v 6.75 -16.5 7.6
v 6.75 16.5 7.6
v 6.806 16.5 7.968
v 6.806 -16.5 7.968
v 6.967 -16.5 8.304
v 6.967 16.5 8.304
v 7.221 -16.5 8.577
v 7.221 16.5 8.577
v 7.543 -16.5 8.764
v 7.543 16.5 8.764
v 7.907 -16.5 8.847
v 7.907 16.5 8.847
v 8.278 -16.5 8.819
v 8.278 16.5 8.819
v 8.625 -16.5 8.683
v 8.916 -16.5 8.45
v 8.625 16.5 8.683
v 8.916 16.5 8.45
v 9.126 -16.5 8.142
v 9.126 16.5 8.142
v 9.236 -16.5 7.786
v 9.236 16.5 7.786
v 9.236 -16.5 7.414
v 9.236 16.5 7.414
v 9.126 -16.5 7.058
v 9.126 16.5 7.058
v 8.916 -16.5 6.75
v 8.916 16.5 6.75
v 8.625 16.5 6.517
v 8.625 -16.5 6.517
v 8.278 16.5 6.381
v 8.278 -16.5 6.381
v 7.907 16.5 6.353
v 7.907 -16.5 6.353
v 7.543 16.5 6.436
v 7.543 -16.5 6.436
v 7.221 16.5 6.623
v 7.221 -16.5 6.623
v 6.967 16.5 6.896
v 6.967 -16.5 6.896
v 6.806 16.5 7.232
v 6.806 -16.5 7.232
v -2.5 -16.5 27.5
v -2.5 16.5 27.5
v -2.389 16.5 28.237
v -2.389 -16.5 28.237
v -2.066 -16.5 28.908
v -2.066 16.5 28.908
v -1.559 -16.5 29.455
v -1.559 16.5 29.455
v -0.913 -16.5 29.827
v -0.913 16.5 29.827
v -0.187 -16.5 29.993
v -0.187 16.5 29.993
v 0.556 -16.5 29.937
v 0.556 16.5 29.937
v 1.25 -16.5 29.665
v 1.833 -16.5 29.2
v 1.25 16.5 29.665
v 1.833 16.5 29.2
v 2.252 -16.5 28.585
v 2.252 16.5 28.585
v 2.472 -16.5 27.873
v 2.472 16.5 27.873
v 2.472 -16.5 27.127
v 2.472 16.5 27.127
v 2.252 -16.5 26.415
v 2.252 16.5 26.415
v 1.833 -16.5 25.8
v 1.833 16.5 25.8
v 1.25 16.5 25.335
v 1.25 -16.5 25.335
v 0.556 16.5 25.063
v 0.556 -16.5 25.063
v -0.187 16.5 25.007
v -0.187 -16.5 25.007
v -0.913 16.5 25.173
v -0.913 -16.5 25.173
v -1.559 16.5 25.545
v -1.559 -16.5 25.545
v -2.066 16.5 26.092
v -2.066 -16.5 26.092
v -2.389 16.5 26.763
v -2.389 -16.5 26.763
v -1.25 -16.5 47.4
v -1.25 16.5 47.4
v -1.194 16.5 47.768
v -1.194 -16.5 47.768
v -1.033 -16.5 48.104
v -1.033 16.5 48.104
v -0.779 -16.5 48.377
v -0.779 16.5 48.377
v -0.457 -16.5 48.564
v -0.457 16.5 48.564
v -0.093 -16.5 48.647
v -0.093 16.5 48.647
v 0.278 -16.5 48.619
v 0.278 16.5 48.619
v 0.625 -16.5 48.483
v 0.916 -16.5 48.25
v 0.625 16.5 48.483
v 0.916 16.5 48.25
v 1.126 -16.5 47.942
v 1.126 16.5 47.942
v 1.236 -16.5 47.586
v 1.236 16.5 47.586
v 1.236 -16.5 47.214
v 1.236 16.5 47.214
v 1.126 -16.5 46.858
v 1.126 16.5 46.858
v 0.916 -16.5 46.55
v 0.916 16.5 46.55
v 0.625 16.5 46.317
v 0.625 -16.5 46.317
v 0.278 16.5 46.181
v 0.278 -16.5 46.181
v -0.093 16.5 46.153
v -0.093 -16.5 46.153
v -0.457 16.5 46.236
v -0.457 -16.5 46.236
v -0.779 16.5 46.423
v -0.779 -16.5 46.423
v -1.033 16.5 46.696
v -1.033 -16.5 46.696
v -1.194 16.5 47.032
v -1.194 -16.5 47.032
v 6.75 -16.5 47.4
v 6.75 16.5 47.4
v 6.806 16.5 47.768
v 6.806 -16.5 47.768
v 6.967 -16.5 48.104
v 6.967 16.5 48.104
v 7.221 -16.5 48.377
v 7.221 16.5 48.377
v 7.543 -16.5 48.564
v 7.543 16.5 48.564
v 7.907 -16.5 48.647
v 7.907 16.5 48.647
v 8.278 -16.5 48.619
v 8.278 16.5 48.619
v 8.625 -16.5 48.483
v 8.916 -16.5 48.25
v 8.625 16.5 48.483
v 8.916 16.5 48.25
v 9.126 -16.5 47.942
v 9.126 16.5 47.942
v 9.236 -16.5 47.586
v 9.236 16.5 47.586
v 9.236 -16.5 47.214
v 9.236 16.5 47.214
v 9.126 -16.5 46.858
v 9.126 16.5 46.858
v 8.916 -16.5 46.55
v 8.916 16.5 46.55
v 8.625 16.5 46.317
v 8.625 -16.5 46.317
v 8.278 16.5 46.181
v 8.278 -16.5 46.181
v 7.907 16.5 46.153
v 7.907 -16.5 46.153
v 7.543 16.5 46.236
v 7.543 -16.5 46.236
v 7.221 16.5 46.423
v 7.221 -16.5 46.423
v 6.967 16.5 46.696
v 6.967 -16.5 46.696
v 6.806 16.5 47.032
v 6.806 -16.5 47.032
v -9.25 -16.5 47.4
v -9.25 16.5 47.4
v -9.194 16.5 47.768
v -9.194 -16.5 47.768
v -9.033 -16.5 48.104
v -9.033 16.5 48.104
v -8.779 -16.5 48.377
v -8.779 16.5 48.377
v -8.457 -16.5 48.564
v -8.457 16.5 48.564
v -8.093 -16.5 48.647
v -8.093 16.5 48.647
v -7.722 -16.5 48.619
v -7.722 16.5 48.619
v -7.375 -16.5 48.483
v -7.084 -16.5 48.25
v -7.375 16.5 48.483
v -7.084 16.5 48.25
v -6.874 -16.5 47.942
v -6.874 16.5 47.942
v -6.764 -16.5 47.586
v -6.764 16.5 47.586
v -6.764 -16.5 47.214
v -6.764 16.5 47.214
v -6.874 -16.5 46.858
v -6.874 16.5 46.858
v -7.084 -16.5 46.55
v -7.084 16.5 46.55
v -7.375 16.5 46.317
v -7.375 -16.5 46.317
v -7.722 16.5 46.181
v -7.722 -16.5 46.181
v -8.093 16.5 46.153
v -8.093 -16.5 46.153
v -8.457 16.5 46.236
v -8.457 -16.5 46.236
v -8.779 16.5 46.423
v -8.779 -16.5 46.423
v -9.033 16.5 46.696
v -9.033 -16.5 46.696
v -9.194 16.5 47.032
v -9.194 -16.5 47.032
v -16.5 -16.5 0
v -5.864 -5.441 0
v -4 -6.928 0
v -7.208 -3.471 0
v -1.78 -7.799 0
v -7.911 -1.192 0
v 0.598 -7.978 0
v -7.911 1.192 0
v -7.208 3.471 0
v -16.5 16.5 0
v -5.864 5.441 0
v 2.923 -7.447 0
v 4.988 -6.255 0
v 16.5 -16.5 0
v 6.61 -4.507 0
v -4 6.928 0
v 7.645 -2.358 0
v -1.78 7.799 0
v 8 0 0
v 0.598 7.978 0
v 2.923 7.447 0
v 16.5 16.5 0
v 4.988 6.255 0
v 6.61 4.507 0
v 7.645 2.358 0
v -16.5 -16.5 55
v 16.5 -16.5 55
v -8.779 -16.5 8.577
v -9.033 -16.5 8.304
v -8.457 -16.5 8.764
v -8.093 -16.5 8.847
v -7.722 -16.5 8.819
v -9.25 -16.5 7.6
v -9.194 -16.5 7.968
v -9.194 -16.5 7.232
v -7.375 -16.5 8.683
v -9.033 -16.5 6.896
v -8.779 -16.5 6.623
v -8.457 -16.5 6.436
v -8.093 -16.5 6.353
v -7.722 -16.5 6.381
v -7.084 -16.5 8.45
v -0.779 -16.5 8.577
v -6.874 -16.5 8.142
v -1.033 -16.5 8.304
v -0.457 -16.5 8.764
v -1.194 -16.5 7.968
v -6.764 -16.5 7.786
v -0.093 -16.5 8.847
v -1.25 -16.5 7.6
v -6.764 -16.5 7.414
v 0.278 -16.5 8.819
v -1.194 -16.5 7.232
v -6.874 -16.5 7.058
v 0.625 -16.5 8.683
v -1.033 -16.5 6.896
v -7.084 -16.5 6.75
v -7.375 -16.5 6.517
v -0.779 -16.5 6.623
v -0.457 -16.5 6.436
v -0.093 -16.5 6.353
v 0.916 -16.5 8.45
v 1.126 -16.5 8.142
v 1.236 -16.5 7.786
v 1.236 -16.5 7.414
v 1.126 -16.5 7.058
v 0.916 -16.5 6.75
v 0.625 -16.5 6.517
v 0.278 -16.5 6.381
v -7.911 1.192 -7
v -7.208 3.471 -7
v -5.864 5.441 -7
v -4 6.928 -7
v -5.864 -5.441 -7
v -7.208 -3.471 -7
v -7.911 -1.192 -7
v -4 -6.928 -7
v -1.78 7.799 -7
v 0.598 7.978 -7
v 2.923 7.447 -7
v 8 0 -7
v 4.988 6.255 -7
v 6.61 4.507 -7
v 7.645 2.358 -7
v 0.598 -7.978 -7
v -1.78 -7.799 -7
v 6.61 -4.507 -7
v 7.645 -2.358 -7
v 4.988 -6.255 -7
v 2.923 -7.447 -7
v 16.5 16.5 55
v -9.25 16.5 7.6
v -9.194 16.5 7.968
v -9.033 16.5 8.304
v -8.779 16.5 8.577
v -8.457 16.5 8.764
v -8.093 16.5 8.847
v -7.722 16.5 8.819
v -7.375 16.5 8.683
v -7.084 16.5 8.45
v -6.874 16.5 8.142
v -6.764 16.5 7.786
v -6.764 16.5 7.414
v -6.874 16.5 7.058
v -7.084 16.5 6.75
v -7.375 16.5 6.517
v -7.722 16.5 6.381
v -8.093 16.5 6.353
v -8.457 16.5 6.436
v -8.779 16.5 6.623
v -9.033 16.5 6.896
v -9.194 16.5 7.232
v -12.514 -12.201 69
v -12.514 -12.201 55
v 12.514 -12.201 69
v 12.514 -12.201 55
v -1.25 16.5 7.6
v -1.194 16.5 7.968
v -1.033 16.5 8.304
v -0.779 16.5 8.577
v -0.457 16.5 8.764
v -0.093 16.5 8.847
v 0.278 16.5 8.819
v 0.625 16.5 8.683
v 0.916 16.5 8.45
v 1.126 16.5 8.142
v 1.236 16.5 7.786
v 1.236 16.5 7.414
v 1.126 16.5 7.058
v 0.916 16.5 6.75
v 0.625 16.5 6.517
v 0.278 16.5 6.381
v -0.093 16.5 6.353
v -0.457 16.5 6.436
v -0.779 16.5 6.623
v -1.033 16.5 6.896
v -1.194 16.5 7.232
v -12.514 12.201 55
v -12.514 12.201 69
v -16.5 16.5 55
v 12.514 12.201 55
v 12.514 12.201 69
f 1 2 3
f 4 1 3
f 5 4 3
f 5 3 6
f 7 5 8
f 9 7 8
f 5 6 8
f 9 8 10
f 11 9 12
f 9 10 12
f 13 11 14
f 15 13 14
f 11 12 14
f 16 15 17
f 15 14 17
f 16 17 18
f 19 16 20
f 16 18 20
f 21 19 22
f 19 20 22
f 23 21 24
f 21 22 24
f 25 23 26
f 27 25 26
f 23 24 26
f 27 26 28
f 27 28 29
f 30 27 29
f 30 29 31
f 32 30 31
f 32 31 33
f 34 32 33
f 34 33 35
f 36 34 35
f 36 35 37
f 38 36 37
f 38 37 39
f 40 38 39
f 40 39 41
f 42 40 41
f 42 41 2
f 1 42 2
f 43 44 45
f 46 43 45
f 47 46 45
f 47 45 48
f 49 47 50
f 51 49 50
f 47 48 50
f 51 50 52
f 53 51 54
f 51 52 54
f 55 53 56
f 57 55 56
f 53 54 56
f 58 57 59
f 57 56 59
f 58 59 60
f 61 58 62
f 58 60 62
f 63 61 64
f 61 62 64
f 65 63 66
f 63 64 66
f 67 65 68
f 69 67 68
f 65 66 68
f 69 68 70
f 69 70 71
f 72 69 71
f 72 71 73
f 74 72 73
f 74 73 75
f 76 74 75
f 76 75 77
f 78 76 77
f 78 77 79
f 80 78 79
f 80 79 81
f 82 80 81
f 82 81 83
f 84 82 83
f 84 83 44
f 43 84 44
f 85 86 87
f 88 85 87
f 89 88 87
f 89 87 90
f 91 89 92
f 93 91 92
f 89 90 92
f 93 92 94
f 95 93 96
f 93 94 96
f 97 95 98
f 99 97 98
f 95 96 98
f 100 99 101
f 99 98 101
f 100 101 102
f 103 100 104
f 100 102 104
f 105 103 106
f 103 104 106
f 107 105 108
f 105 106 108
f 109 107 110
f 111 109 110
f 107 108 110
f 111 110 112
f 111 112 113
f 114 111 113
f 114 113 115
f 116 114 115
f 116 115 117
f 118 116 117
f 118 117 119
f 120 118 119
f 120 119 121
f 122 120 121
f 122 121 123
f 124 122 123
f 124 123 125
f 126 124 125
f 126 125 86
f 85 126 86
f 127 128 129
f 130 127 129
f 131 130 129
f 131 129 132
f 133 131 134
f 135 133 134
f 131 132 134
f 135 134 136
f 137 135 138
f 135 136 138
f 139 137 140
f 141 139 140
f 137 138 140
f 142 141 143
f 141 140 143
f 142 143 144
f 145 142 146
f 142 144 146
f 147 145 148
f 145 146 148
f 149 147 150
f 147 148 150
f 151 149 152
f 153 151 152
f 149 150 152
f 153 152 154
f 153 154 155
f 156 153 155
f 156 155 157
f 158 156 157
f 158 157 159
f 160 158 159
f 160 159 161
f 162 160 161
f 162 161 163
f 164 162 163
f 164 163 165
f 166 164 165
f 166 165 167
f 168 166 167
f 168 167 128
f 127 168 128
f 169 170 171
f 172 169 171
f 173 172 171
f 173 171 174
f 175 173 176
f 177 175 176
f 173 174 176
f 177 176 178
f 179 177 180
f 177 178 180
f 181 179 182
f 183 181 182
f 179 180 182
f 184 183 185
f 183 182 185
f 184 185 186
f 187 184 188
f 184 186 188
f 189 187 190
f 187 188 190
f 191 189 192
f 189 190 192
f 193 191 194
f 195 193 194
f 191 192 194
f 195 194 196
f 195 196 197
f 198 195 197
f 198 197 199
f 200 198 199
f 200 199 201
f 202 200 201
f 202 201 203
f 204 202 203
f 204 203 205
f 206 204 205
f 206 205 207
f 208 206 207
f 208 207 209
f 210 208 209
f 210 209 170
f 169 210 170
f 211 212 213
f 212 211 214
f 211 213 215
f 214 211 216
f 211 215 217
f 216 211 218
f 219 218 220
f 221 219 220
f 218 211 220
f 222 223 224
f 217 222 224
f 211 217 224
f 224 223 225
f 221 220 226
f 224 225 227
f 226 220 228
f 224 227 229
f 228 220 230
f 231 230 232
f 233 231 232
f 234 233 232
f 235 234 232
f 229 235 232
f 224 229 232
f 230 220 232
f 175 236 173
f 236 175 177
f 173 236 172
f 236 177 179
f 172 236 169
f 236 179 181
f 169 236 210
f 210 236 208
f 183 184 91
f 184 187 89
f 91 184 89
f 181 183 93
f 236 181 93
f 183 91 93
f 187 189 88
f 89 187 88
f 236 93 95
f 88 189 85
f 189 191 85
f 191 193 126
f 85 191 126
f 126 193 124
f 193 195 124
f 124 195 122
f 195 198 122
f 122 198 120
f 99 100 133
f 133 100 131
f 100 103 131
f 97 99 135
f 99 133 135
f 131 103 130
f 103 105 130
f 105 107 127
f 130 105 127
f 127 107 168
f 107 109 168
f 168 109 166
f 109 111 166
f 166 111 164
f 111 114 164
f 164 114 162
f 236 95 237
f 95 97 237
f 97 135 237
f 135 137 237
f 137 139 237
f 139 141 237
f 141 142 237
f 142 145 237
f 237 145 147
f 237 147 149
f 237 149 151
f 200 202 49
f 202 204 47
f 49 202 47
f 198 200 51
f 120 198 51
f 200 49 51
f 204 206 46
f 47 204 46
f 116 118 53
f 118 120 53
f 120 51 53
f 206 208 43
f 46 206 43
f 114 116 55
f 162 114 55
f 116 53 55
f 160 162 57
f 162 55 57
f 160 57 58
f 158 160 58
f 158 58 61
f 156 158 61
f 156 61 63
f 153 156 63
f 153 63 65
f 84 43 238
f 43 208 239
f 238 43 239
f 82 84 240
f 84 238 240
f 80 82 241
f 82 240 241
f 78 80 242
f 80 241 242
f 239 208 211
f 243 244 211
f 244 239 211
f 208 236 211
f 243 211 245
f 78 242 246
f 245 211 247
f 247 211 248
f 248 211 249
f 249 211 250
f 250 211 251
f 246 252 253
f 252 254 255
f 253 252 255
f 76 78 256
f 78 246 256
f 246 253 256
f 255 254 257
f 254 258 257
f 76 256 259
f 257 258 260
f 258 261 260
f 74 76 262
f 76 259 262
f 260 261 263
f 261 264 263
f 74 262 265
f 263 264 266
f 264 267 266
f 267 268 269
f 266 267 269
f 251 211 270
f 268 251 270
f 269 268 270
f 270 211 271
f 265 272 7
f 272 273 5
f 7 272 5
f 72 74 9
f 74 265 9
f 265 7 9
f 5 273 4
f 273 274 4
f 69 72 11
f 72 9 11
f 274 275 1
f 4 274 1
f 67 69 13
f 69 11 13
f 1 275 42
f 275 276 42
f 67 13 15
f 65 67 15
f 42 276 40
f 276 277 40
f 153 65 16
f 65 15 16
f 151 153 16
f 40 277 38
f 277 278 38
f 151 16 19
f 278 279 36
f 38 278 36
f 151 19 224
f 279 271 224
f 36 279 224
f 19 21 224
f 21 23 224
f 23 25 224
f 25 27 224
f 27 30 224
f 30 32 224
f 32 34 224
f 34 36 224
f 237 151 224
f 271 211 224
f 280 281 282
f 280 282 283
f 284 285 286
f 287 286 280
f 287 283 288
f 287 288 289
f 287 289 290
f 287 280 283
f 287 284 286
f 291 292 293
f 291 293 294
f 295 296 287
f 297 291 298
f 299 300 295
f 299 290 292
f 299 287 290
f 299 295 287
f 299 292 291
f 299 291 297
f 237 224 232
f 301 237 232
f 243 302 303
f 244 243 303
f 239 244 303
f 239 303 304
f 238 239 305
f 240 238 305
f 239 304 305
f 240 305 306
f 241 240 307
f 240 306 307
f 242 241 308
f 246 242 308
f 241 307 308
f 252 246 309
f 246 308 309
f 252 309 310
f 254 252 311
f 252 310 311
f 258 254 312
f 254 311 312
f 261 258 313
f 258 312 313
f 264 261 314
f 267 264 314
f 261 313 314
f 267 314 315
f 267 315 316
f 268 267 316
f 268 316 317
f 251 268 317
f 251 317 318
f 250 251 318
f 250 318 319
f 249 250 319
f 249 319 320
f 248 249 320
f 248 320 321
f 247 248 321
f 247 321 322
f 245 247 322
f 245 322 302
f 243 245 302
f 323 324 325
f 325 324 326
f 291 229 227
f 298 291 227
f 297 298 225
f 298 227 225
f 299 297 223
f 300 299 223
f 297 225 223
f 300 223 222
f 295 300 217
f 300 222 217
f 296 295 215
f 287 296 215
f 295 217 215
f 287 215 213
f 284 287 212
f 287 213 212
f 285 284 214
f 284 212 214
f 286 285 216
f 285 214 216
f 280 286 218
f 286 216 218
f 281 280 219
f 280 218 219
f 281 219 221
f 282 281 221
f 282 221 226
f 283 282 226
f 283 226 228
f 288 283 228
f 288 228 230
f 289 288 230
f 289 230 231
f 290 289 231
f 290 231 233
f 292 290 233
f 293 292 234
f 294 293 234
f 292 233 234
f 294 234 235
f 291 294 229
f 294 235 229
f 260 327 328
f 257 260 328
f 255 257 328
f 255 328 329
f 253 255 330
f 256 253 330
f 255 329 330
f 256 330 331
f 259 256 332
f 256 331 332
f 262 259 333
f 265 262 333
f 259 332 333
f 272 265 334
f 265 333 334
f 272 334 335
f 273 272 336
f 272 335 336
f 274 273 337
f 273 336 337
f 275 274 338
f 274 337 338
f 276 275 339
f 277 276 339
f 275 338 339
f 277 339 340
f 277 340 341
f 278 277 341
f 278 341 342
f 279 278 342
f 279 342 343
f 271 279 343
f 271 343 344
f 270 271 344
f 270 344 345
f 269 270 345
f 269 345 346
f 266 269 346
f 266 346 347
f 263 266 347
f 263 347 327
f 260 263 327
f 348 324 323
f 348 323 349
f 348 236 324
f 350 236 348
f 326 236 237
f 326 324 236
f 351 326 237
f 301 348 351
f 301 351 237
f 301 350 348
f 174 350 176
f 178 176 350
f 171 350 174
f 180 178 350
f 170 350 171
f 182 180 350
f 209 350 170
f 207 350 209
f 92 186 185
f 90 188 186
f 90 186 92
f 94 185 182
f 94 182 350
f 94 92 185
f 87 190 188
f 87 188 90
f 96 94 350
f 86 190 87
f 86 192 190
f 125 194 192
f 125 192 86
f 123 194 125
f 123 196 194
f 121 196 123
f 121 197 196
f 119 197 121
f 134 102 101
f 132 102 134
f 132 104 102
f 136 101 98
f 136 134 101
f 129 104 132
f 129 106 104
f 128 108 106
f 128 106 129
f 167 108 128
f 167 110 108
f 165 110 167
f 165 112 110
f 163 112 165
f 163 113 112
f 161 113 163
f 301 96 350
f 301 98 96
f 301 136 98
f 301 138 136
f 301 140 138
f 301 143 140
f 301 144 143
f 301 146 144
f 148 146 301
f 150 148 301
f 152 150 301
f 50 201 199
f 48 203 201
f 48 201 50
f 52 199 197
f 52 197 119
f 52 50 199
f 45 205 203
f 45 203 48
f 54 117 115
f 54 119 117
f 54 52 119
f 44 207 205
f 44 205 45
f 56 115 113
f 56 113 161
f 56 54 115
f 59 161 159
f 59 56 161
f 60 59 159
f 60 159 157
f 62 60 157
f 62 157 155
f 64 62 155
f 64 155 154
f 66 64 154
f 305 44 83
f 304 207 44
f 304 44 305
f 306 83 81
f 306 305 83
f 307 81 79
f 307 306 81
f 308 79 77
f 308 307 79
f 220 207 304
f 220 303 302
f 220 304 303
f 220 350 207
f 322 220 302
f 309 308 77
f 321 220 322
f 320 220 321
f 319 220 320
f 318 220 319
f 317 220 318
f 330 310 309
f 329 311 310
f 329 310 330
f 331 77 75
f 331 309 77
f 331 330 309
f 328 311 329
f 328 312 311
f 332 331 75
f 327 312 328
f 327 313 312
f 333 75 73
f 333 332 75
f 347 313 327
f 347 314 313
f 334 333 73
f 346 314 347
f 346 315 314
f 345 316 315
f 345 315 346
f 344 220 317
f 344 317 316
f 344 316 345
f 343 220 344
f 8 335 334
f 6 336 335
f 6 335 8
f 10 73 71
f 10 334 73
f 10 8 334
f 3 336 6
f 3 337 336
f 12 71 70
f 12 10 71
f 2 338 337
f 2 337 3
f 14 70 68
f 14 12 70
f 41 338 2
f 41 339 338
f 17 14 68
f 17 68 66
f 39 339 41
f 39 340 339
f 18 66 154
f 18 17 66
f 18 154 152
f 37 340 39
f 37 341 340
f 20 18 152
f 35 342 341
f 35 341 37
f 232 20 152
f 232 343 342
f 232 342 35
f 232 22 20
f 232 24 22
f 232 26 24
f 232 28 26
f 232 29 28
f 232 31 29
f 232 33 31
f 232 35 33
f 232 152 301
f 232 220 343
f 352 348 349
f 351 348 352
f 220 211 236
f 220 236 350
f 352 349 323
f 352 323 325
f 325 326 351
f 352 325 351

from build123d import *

# Parameters (mm, degrees)
F0_W     = 33
F0_H     = 33
F1_DEPTH = 55
F2_W     = 25.027660653
F2_H     = 24.4021397084
F3_DEPTH = 14
F4_R     = 8
F5_DEPTH = 7
F7_D     = 2.5
F8_D     = 5


with BuildPart() as f1:
    # F0 (on Top) → F1 (new body)
    with BuildSketch(Plane.XY):
        Rectangle(F0_W, F0_H)
    extrude(amount=F1_DEPTH)

    # F2 (on face) → F3 (join)
    with BuildSketch(Plane.XY.offset(55)):
        Rectangle(F2_W, F2_H)
    extrude(amount=F3_DEPTH)

    # F4 (on face) → F5 (join)
    with BuildSketch(Plane(origin=(0, 0, 0), x_dir=(1, 0, 0), z_dir=(0, 0, -1))):
        Circle(F4_R)
    extrude(amount=F5_DEPTH)

    # F7 (through all)
    with Locations(Plane.XZ.offset(16.5)):
        with Locations((-8, 47.4), (0, 47.4), (8, 47.4), (8, 7.6), (0, 7.6), (-8, 7.6)):
            Hole(F7_D / 2)

    # F8 (through all)
    with Locations(Plane.XZ.offset(16.5)):
        with Locations((0, 27.5)):
            Hole(F8_D / 2)


solid = f1.part
